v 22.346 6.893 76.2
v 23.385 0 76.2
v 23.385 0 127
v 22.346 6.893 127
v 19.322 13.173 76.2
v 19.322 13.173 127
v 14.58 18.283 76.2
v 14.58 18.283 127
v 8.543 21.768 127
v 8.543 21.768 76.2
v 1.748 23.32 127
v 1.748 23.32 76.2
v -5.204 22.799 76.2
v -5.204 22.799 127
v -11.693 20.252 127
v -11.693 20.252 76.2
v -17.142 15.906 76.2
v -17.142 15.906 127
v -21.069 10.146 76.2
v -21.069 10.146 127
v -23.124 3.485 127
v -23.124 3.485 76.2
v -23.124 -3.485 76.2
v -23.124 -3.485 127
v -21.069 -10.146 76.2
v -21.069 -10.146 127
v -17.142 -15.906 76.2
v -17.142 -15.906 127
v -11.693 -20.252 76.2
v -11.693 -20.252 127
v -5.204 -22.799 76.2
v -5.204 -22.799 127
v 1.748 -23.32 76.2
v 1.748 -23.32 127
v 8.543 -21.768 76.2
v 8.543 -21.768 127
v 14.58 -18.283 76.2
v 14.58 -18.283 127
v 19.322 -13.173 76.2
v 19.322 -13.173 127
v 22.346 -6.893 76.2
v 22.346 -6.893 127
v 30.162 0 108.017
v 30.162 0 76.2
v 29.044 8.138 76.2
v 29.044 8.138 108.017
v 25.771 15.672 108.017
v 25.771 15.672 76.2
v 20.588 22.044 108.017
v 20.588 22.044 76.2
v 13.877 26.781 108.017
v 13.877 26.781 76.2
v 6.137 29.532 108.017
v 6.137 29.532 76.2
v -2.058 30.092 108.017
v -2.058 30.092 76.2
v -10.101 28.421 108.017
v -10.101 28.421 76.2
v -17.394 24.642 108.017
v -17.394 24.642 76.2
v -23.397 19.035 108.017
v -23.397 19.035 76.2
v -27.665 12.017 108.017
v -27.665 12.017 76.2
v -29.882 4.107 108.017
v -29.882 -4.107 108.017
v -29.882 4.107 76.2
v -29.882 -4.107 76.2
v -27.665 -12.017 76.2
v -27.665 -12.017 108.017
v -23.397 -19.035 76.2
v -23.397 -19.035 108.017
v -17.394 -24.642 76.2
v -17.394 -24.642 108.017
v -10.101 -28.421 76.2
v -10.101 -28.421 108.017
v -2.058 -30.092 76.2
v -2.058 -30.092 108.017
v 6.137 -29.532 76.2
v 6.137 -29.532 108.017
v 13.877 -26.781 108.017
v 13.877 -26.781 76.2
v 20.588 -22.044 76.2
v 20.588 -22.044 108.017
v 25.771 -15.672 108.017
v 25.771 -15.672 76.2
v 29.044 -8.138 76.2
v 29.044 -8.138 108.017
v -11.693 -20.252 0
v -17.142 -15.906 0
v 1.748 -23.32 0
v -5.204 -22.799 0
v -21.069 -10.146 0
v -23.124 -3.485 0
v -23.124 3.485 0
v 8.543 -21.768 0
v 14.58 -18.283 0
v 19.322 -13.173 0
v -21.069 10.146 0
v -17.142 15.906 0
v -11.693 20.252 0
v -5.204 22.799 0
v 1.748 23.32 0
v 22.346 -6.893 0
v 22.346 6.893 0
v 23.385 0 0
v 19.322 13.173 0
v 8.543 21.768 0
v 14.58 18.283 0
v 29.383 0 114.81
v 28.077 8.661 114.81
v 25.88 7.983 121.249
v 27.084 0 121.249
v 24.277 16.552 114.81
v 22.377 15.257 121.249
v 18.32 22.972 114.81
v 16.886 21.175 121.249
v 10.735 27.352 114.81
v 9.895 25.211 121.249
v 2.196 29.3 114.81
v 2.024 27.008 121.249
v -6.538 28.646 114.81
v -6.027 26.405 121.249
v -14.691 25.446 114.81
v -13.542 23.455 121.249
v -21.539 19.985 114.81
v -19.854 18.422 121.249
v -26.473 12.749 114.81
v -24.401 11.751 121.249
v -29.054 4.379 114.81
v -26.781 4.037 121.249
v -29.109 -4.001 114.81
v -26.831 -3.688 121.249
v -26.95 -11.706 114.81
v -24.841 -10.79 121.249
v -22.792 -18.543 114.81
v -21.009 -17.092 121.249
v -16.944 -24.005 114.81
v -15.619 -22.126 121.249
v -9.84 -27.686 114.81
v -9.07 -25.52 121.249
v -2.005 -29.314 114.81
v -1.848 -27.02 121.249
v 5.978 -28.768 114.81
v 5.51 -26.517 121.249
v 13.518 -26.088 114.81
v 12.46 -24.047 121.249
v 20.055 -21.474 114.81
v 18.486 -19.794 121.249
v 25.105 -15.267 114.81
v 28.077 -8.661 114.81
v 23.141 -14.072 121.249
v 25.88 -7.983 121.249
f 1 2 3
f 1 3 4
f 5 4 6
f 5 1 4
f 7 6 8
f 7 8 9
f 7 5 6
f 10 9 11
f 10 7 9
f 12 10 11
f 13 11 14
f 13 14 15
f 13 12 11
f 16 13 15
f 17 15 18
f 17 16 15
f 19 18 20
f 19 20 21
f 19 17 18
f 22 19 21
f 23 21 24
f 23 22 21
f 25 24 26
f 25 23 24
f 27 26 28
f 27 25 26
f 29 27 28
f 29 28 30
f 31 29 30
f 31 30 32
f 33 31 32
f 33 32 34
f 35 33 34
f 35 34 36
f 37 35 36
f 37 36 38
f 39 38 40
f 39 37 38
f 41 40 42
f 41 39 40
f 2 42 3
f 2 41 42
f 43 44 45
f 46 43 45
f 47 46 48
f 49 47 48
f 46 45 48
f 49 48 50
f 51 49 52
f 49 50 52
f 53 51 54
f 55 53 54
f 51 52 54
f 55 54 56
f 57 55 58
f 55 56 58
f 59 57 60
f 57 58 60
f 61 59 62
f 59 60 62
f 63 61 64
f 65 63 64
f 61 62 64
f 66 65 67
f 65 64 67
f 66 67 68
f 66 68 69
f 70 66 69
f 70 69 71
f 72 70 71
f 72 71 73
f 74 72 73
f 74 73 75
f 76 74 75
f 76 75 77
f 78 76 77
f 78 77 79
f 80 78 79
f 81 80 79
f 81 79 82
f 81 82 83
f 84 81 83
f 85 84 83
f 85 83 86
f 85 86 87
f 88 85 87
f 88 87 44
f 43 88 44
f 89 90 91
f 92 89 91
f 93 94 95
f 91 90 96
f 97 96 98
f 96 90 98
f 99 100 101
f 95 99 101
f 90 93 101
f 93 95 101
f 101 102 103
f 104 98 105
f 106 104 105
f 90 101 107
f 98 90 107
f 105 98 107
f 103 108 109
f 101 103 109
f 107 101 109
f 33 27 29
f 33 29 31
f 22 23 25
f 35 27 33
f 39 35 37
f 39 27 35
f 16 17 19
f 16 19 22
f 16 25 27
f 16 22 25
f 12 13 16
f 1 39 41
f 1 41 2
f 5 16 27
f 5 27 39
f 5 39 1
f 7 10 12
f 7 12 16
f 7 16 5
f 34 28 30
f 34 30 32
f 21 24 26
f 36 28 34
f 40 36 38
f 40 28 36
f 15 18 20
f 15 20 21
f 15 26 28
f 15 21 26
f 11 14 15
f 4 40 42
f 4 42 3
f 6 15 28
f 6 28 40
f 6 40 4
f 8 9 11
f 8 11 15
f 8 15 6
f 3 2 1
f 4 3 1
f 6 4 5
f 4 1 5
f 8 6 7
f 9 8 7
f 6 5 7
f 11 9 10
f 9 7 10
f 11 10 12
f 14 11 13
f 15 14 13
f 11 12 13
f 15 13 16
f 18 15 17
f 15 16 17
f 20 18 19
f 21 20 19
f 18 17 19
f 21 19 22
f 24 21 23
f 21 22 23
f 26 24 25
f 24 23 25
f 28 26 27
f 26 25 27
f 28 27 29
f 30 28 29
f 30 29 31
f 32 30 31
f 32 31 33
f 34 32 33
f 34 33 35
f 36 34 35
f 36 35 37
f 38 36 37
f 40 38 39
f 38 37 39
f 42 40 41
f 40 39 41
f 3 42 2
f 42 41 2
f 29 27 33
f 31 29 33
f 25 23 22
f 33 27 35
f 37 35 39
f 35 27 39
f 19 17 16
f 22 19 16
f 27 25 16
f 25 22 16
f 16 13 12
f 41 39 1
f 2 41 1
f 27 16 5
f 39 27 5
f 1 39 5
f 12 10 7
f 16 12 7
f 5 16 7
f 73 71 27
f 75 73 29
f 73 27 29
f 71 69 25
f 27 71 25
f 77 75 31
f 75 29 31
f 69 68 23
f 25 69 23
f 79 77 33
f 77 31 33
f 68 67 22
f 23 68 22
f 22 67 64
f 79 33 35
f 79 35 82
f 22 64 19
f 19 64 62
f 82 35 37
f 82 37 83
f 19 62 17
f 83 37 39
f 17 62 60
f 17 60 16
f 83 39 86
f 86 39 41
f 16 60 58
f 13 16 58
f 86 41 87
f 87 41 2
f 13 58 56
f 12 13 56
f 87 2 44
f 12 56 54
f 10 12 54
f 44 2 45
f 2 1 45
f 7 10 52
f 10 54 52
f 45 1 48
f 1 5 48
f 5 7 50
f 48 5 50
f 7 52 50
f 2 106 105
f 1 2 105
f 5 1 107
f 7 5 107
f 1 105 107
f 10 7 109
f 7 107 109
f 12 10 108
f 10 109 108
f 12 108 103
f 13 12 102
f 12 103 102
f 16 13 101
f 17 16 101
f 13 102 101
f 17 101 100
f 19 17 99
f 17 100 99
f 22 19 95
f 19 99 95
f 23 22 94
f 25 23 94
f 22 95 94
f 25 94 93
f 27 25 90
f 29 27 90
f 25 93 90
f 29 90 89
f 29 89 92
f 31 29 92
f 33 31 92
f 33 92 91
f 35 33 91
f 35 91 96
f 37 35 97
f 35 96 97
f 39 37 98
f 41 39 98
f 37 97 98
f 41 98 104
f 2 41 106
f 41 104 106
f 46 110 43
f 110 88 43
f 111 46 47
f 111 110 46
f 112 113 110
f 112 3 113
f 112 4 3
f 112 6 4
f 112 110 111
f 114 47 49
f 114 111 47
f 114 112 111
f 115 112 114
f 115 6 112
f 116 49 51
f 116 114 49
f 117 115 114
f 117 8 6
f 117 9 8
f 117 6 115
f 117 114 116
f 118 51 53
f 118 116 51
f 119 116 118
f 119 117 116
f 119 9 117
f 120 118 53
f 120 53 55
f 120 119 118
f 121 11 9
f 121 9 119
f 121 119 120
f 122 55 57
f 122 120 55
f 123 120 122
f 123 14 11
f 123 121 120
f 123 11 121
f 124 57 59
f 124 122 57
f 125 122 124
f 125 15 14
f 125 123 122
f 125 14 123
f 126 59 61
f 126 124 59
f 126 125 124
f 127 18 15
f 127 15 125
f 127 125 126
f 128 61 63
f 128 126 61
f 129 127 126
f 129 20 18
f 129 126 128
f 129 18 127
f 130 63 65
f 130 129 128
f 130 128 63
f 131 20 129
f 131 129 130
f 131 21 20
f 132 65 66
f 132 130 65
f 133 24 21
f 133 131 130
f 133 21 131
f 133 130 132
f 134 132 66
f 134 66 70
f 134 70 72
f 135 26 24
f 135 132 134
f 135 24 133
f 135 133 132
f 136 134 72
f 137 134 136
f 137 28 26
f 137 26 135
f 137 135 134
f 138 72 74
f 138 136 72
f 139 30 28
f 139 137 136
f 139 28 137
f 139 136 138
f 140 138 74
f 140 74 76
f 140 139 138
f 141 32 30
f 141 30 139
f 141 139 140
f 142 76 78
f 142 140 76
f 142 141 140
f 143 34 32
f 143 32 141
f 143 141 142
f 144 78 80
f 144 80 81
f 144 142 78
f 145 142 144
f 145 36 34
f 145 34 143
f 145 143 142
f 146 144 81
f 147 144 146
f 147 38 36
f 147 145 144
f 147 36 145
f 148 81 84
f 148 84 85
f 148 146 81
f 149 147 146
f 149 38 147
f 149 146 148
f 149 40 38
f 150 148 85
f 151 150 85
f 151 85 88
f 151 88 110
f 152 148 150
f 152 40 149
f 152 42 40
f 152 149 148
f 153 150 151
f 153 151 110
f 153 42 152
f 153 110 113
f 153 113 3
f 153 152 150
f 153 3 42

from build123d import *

# Parameters (mm, degrees)
F0_R     = 23.38500022
F1_DEPTH = 76.2
F2_R     = 30.1625
F2_R_2   = 23.38500022
F3_DEPTH = 50.8
F4_DEPTH = 50.8


# Not quite as in the source:
# - a fillet or chamfer that OpenCascade refuses, or shapes differently, is made with other operations: its cross-section is extruded or revolved along the edge and cut away or added


with BuildPart() as f1:
    # F0 (on Top) → F1 (new body)
    with BuildSketch(Plane.XY):
        Circle(F0_R)
    extrude(amount=F1_DEPTH)


with BuildPart() as f3:
    # F2 (on face) → F3 (new body)
    with BuildSketch(Plane.XY.offset(76.2)):
        Circle(F2_R)
        Circle(F2_R_2, mode=Mode.SUBTRACT)
    extrude(amount=F3_DEPTH)

    # F5: fillet of radius 29.972 on 1 edges, made by hand

    # F5_s1 → F5_t2 (revolve, cut)
    with BuildSketch(Plane.XZ):
        with BuildLine():
            ThreePointArc((30.1625, 108.0174832136), (28.4173165456, 118.0955590073), (23.38500022, 127))
            Line((23.38500022, 127), (30.1625, 127))
            Line((30.1625, 127), (30.1625, 108.0174832136))
        make_face()
    revolve(axis=Axis((0, 0, 127), (0, 0, 1)), mode=Mode.SUBTRACT)


with BuildPart() as f4:
    # F4 (new): a face of the model
    f4_faces = [f1.part.faces().sort_by_distance(p)[0] for p in [
        (0, 0, 76.2),
    ]]
    extrude(f4_faces, amount=F4_DEPTH)


solid = Compound([f1.part, f3.part, f4.part])
